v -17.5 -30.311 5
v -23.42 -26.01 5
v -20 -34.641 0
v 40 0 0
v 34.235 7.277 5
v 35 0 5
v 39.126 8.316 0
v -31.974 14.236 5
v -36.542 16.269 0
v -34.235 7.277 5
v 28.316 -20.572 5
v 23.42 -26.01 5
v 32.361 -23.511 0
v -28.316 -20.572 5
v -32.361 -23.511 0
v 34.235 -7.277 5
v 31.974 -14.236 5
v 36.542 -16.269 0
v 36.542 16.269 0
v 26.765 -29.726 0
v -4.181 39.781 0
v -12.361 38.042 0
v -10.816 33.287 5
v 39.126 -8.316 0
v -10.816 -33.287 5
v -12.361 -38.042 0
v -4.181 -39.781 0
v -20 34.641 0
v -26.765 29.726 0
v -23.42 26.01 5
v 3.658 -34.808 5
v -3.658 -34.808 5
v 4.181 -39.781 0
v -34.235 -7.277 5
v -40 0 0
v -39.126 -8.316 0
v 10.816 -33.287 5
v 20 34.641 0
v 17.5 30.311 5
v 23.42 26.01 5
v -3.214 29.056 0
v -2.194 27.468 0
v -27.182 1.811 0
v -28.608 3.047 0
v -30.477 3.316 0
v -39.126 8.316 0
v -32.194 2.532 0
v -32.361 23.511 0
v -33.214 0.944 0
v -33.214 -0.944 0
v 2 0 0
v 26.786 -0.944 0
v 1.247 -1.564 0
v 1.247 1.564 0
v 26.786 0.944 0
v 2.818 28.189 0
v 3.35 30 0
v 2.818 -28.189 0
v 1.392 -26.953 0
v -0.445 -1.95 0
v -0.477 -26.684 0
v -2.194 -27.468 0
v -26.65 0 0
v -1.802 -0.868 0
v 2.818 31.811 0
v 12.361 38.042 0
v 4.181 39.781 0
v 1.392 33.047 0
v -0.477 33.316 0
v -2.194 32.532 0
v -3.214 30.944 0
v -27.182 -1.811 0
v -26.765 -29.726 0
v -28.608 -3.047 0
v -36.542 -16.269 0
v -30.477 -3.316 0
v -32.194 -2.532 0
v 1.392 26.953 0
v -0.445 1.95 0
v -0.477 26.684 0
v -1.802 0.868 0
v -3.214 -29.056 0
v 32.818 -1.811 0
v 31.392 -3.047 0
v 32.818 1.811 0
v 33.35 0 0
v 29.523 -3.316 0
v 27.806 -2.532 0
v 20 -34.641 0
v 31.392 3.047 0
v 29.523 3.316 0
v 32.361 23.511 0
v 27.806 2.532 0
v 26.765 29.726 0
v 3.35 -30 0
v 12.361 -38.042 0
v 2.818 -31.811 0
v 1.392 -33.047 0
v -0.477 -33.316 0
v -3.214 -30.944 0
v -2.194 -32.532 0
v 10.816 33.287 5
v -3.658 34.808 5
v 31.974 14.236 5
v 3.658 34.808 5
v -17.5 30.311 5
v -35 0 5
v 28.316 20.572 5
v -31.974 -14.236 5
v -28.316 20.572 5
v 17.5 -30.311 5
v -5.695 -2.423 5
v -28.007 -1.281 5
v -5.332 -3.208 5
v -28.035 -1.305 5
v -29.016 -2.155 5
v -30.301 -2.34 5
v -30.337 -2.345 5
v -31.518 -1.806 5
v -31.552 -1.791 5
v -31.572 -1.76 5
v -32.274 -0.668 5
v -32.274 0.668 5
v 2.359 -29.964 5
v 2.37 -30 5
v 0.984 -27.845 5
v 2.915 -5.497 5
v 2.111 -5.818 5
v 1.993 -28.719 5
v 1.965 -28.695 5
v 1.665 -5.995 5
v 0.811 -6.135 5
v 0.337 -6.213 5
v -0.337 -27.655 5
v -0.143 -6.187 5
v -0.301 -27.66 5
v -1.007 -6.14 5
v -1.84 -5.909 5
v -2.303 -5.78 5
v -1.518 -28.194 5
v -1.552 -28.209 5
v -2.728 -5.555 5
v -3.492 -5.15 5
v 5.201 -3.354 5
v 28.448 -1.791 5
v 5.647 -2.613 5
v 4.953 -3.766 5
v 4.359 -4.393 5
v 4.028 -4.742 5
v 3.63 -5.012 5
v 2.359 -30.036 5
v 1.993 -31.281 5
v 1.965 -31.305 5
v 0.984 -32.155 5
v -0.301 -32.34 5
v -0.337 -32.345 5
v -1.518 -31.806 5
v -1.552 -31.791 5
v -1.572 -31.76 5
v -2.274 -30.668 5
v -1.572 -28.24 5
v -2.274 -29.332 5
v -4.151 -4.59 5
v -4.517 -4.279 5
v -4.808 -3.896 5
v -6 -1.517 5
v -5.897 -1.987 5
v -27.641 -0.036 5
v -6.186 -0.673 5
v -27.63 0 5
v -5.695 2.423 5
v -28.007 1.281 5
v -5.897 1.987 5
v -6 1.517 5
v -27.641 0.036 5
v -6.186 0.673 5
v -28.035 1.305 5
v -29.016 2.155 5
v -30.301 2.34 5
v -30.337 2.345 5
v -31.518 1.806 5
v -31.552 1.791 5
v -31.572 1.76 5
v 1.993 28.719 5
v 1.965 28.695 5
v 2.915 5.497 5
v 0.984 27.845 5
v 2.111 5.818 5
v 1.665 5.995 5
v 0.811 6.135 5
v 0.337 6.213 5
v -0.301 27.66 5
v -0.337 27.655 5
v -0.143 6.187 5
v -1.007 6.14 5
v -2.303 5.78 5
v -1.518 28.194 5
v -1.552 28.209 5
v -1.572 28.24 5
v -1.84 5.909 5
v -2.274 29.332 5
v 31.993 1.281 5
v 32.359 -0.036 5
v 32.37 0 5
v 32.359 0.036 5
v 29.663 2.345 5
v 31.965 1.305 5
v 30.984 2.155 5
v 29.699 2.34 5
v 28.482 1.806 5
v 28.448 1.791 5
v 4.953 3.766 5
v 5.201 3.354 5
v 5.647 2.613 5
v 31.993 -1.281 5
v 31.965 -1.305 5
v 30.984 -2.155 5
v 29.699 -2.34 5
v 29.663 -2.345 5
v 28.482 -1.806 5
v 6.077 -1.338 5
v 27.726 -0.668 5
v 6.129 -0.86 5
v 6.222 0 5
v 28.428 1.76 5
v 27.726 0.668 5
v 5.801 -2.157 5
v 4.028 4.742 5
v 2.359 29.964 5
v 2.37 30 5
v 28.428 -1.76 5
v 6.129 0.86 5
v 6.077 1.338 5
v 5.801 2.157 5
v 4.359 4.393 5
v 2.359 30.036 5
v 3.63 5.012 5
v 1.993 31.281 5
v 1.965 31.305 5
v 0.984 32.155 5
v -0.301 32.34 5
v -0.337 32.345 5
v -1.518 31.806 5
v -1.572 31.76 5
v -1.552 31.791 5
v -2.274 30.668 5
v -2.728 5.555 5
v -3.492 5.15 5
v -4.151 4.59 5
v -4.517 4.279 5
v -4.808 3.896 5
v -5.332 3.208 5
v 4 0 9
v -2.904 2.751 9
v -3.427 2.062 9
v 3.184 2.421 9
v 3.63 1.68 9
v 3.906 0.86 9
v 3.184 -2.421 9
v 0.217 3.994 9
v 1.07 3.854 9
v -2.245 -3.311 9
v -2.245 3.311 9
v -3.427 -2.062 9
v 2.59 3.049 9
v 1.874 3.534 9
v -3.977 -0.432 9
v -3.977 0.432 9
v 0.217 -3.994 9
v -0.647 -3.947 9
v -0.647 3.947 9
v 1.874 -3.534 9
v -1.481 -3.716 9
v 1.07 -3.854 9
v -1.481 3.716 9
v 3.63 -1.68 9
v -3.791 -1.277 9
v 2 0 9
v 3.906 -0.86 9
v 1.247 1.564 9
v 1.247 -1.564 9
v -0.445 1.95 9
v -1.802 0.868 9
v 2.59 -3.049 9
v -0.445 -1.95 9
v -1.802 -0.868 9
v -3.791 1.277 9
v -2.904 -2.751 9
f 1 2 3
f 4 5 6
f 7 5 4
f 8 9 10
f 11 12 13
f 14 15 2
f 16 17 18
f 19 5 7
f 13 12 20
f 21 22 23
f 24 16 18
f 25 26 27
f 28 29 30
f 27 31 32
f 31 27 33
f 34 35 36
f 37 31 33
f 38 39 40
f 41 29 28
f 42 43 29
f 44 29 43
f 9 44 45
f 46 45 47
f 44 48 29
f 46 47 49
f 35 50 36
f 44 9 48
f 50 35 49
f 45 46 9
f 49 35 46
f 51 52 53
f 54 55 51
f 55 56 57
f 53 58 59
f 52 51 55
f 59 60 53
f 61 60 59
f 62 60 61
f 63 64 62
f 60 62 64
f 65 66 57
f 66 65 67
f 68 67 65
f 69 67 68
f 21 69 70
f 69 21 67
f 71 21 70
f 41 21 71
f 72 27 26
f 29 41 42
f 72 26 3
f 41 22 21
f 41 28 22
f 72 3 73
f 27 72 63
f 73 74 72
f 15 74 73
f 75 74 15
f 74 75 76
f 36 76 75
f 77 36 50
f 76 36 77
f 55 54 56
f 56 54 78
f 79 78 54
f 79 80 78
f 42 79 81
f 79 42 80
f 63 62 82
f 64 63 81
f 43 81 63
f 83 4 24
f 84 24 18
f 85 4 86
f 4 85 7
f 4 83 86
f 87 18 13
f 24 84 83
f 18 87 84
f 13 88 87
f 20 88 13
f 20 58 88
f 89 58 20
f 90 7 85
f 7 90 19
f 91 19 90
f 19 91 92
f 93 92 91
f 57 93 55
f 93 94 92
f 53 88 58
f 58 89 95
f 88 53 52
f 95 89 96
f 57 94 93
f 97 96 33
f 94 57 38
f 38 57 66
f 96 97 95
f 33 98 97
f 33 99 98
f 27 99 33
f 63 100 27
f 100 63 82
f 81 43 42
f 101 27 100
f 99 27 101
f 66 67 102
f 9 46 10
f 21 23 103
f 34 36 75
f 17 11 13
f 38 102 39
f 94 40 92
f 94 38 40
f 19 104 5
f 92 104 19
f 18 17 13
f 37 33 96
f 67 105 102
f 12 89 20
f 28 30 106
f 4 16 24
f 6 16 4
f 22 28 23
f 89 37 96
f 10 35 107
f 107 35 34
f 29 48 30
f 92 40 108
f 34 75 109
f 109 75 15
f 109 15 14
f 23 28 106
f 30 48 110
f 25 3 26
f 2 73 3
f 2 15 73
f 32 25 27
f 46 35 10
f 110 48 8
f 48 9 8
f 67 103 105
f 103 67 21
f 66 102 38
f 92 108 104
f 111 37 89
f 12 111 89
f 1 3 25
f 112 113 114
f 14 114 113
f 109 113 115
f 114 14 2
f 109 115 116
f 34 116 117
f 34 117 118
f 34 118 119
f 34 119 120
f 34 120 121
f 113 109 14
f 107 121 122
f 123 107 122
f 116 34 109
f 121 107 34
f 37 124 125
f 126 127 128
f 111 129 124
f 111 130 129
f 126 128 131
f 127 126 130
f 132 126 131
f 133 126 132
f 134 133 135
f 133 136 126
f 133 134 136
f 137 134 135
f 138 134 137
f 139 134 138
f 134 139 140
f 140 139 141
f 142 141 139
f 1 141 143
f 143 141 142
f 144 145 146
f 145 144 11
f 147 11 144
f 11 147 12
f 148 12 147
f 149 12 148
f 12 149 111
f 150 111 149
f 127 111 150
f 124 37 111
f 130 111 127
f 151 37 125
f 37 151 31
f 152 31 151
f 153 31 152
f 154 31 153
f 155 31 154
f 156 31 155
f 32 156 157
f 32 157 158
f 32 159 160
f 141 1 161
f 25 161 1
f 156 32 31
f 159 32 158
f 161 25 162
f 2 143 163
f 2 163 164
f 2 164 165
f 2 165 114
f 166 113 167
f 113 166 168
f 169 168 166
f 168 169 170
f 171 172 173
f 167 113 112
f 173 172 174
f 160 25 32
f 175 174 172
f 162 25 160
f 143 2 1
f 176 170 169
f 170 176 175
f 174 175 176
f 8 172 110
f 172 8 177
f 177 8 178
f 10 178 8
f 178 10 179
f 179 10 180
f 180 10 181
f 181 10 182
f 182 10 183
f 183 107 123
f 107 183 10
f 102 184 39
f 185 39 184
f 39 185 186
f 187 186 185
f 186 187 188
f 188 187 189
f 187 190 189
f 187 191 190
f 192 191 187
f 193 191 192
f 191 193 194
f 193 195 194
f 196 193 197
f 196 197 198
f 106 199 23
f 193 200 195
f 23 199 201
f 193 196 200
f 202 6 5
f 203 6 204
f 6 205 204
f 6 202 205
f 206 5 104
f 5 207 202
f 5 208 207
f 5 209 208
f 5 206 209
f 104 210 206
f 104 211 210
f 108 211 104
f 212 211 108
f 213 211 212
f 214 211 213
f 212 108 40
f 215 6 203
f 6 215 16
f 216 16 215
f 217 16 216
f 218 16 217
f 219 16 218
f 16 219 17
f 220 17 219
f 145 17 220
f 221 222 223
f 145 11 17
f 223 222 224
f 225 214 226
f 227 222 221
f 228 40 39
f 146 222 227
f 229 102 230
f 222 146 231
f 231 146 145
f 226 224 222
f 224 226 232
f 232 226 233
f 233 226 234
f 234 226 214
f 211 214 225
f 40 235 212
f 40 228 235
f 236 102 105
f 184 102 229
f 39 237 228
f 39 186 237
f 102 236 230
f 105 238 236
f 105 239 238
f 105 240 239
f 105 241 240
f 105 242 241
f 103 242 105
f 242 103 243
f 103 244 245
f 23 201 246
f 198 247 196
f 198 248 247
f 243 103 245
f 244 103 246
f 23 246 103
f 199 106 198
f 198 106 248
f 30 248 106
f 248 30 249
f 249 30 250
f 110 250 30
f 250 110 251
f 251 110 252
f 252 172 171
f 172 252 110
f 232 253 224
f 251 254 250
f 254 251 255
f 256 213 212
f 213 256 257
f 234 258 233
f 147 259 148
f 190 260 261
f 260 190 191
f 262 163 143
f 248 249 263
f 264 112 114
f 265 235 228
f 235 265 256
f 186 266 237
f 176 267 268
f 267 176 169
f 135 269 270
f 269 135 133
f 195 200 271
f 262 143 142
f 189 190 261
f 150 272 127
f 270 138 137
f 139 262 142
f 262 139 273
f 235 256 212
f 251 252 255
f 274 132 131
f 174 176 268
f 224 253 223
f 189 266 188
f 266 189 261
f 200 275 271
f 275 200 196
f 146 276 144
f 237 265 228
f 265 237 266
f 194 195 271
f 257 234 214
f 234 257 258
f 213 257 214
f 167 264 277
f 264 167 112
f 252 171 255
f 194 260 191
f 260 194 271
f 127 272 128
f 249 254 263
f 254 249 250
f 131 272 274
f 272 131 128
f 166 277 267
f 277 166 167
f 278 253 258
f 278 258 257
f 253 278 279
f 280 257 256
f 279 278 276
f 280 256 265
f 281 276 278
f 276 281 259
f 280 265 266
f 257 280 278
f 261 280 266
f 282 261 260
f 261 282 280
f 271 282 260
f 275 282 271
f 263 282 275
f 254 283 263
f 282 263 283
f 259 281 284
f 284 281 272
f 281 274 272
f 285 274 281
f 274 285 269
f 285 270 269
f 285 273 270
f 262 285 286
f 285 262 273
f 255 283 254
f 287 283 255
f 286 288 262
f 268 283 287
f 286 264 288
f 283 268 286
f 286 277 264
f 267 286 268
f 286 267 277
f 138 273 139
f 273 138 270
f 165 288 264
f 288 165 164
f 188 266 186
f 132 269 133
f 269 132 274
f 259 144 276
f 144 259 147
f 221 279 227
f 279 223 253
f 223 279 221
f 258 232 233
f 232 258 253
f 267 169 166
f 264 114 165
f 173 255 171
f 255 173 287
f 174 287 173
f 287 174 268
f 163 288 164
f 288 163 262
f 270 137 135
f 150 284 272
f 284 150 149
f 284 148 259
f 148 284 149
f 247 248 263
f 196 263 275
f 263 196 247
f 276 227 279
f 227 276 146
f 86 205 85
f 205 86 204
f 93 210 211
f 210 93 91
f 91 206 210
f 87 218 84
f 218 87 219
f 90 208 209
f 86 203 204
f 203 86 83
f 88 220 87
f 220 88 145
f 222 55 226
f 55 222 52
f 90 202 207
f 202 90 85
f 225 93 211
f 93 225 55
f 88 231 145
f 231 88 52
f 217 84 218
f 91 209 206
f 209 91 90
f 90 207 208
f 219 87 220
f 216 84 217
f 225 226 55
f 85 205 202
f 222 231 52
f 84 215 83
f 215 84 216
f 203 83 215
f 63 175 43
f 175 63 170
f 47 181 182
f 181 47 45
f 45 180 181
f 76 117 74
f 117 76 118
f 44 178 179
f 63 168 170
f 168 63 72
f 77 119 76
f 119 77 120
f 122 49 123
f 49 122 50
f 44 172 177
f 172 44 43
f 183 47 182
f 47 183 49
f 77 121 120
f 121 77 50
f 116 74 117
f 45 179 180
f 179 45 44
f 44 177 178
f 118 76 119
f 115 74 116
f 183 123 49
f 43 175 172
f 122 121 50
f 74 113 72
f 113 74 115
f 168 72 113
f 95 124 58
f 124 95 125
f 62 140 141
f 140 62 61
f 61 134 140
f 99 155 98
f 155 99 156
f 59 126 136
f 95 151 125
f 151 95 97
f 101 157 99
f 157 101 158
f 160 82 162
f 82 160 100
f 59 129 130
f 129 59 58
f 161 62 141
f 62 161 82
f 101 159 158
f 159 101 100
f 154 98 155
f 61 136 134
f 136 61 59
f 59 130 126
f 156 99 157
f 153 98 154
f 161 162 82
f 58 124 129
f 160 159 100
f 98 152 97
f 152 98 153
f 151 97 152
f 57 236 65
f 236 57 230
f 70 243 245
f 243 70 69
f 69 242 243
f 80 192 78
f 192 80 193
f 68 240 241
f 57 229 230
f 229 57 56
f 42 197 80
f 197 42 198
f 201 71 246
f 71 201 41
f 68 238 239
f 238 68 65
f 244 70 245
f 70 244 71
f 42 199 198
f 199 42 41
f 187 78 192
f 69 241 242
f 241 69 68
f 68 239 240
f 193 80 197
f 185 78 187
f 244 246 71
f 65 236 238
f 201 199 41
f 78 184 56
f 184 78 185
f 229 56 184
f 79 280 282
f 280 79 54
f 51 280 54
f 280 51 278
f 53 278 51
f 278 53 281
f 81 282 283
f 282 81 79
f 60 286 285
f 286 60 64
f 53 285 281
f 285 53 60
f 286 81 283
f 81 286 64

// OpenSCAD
//parameters
mount_diameter = 40;
mount_hole_size = 3.35;
hook_diameter = 2;

difference() {
    union() {
    cylinder(5,mount_diameter,mount_diameter - 5);
    cylinder(9,9,4);
    }
    translate([mount_diameter - mount_diameter / 4,0,0]) cylinder(5.1,mount_hole_size,mount_hole_size - 1);
    translate([(mount_diameter - mount_diameter / 4) * -1,0,0]) cylinder(5.1,mount_hole_size,mount_hole_size - 1);
    translate([0,(mount_diameter - mount_diameter / 4) * -1,0]) cylinder(5.1,mount_hole_size,mount_hole_size - 1);
    translate([0,mount_diameter - mount_diameter / 4,0]) cylinder(5.1,mount_hole_size,mount_hole_size - 1);
    cylinder(9,hook_diameter,hook_diameter);
}
